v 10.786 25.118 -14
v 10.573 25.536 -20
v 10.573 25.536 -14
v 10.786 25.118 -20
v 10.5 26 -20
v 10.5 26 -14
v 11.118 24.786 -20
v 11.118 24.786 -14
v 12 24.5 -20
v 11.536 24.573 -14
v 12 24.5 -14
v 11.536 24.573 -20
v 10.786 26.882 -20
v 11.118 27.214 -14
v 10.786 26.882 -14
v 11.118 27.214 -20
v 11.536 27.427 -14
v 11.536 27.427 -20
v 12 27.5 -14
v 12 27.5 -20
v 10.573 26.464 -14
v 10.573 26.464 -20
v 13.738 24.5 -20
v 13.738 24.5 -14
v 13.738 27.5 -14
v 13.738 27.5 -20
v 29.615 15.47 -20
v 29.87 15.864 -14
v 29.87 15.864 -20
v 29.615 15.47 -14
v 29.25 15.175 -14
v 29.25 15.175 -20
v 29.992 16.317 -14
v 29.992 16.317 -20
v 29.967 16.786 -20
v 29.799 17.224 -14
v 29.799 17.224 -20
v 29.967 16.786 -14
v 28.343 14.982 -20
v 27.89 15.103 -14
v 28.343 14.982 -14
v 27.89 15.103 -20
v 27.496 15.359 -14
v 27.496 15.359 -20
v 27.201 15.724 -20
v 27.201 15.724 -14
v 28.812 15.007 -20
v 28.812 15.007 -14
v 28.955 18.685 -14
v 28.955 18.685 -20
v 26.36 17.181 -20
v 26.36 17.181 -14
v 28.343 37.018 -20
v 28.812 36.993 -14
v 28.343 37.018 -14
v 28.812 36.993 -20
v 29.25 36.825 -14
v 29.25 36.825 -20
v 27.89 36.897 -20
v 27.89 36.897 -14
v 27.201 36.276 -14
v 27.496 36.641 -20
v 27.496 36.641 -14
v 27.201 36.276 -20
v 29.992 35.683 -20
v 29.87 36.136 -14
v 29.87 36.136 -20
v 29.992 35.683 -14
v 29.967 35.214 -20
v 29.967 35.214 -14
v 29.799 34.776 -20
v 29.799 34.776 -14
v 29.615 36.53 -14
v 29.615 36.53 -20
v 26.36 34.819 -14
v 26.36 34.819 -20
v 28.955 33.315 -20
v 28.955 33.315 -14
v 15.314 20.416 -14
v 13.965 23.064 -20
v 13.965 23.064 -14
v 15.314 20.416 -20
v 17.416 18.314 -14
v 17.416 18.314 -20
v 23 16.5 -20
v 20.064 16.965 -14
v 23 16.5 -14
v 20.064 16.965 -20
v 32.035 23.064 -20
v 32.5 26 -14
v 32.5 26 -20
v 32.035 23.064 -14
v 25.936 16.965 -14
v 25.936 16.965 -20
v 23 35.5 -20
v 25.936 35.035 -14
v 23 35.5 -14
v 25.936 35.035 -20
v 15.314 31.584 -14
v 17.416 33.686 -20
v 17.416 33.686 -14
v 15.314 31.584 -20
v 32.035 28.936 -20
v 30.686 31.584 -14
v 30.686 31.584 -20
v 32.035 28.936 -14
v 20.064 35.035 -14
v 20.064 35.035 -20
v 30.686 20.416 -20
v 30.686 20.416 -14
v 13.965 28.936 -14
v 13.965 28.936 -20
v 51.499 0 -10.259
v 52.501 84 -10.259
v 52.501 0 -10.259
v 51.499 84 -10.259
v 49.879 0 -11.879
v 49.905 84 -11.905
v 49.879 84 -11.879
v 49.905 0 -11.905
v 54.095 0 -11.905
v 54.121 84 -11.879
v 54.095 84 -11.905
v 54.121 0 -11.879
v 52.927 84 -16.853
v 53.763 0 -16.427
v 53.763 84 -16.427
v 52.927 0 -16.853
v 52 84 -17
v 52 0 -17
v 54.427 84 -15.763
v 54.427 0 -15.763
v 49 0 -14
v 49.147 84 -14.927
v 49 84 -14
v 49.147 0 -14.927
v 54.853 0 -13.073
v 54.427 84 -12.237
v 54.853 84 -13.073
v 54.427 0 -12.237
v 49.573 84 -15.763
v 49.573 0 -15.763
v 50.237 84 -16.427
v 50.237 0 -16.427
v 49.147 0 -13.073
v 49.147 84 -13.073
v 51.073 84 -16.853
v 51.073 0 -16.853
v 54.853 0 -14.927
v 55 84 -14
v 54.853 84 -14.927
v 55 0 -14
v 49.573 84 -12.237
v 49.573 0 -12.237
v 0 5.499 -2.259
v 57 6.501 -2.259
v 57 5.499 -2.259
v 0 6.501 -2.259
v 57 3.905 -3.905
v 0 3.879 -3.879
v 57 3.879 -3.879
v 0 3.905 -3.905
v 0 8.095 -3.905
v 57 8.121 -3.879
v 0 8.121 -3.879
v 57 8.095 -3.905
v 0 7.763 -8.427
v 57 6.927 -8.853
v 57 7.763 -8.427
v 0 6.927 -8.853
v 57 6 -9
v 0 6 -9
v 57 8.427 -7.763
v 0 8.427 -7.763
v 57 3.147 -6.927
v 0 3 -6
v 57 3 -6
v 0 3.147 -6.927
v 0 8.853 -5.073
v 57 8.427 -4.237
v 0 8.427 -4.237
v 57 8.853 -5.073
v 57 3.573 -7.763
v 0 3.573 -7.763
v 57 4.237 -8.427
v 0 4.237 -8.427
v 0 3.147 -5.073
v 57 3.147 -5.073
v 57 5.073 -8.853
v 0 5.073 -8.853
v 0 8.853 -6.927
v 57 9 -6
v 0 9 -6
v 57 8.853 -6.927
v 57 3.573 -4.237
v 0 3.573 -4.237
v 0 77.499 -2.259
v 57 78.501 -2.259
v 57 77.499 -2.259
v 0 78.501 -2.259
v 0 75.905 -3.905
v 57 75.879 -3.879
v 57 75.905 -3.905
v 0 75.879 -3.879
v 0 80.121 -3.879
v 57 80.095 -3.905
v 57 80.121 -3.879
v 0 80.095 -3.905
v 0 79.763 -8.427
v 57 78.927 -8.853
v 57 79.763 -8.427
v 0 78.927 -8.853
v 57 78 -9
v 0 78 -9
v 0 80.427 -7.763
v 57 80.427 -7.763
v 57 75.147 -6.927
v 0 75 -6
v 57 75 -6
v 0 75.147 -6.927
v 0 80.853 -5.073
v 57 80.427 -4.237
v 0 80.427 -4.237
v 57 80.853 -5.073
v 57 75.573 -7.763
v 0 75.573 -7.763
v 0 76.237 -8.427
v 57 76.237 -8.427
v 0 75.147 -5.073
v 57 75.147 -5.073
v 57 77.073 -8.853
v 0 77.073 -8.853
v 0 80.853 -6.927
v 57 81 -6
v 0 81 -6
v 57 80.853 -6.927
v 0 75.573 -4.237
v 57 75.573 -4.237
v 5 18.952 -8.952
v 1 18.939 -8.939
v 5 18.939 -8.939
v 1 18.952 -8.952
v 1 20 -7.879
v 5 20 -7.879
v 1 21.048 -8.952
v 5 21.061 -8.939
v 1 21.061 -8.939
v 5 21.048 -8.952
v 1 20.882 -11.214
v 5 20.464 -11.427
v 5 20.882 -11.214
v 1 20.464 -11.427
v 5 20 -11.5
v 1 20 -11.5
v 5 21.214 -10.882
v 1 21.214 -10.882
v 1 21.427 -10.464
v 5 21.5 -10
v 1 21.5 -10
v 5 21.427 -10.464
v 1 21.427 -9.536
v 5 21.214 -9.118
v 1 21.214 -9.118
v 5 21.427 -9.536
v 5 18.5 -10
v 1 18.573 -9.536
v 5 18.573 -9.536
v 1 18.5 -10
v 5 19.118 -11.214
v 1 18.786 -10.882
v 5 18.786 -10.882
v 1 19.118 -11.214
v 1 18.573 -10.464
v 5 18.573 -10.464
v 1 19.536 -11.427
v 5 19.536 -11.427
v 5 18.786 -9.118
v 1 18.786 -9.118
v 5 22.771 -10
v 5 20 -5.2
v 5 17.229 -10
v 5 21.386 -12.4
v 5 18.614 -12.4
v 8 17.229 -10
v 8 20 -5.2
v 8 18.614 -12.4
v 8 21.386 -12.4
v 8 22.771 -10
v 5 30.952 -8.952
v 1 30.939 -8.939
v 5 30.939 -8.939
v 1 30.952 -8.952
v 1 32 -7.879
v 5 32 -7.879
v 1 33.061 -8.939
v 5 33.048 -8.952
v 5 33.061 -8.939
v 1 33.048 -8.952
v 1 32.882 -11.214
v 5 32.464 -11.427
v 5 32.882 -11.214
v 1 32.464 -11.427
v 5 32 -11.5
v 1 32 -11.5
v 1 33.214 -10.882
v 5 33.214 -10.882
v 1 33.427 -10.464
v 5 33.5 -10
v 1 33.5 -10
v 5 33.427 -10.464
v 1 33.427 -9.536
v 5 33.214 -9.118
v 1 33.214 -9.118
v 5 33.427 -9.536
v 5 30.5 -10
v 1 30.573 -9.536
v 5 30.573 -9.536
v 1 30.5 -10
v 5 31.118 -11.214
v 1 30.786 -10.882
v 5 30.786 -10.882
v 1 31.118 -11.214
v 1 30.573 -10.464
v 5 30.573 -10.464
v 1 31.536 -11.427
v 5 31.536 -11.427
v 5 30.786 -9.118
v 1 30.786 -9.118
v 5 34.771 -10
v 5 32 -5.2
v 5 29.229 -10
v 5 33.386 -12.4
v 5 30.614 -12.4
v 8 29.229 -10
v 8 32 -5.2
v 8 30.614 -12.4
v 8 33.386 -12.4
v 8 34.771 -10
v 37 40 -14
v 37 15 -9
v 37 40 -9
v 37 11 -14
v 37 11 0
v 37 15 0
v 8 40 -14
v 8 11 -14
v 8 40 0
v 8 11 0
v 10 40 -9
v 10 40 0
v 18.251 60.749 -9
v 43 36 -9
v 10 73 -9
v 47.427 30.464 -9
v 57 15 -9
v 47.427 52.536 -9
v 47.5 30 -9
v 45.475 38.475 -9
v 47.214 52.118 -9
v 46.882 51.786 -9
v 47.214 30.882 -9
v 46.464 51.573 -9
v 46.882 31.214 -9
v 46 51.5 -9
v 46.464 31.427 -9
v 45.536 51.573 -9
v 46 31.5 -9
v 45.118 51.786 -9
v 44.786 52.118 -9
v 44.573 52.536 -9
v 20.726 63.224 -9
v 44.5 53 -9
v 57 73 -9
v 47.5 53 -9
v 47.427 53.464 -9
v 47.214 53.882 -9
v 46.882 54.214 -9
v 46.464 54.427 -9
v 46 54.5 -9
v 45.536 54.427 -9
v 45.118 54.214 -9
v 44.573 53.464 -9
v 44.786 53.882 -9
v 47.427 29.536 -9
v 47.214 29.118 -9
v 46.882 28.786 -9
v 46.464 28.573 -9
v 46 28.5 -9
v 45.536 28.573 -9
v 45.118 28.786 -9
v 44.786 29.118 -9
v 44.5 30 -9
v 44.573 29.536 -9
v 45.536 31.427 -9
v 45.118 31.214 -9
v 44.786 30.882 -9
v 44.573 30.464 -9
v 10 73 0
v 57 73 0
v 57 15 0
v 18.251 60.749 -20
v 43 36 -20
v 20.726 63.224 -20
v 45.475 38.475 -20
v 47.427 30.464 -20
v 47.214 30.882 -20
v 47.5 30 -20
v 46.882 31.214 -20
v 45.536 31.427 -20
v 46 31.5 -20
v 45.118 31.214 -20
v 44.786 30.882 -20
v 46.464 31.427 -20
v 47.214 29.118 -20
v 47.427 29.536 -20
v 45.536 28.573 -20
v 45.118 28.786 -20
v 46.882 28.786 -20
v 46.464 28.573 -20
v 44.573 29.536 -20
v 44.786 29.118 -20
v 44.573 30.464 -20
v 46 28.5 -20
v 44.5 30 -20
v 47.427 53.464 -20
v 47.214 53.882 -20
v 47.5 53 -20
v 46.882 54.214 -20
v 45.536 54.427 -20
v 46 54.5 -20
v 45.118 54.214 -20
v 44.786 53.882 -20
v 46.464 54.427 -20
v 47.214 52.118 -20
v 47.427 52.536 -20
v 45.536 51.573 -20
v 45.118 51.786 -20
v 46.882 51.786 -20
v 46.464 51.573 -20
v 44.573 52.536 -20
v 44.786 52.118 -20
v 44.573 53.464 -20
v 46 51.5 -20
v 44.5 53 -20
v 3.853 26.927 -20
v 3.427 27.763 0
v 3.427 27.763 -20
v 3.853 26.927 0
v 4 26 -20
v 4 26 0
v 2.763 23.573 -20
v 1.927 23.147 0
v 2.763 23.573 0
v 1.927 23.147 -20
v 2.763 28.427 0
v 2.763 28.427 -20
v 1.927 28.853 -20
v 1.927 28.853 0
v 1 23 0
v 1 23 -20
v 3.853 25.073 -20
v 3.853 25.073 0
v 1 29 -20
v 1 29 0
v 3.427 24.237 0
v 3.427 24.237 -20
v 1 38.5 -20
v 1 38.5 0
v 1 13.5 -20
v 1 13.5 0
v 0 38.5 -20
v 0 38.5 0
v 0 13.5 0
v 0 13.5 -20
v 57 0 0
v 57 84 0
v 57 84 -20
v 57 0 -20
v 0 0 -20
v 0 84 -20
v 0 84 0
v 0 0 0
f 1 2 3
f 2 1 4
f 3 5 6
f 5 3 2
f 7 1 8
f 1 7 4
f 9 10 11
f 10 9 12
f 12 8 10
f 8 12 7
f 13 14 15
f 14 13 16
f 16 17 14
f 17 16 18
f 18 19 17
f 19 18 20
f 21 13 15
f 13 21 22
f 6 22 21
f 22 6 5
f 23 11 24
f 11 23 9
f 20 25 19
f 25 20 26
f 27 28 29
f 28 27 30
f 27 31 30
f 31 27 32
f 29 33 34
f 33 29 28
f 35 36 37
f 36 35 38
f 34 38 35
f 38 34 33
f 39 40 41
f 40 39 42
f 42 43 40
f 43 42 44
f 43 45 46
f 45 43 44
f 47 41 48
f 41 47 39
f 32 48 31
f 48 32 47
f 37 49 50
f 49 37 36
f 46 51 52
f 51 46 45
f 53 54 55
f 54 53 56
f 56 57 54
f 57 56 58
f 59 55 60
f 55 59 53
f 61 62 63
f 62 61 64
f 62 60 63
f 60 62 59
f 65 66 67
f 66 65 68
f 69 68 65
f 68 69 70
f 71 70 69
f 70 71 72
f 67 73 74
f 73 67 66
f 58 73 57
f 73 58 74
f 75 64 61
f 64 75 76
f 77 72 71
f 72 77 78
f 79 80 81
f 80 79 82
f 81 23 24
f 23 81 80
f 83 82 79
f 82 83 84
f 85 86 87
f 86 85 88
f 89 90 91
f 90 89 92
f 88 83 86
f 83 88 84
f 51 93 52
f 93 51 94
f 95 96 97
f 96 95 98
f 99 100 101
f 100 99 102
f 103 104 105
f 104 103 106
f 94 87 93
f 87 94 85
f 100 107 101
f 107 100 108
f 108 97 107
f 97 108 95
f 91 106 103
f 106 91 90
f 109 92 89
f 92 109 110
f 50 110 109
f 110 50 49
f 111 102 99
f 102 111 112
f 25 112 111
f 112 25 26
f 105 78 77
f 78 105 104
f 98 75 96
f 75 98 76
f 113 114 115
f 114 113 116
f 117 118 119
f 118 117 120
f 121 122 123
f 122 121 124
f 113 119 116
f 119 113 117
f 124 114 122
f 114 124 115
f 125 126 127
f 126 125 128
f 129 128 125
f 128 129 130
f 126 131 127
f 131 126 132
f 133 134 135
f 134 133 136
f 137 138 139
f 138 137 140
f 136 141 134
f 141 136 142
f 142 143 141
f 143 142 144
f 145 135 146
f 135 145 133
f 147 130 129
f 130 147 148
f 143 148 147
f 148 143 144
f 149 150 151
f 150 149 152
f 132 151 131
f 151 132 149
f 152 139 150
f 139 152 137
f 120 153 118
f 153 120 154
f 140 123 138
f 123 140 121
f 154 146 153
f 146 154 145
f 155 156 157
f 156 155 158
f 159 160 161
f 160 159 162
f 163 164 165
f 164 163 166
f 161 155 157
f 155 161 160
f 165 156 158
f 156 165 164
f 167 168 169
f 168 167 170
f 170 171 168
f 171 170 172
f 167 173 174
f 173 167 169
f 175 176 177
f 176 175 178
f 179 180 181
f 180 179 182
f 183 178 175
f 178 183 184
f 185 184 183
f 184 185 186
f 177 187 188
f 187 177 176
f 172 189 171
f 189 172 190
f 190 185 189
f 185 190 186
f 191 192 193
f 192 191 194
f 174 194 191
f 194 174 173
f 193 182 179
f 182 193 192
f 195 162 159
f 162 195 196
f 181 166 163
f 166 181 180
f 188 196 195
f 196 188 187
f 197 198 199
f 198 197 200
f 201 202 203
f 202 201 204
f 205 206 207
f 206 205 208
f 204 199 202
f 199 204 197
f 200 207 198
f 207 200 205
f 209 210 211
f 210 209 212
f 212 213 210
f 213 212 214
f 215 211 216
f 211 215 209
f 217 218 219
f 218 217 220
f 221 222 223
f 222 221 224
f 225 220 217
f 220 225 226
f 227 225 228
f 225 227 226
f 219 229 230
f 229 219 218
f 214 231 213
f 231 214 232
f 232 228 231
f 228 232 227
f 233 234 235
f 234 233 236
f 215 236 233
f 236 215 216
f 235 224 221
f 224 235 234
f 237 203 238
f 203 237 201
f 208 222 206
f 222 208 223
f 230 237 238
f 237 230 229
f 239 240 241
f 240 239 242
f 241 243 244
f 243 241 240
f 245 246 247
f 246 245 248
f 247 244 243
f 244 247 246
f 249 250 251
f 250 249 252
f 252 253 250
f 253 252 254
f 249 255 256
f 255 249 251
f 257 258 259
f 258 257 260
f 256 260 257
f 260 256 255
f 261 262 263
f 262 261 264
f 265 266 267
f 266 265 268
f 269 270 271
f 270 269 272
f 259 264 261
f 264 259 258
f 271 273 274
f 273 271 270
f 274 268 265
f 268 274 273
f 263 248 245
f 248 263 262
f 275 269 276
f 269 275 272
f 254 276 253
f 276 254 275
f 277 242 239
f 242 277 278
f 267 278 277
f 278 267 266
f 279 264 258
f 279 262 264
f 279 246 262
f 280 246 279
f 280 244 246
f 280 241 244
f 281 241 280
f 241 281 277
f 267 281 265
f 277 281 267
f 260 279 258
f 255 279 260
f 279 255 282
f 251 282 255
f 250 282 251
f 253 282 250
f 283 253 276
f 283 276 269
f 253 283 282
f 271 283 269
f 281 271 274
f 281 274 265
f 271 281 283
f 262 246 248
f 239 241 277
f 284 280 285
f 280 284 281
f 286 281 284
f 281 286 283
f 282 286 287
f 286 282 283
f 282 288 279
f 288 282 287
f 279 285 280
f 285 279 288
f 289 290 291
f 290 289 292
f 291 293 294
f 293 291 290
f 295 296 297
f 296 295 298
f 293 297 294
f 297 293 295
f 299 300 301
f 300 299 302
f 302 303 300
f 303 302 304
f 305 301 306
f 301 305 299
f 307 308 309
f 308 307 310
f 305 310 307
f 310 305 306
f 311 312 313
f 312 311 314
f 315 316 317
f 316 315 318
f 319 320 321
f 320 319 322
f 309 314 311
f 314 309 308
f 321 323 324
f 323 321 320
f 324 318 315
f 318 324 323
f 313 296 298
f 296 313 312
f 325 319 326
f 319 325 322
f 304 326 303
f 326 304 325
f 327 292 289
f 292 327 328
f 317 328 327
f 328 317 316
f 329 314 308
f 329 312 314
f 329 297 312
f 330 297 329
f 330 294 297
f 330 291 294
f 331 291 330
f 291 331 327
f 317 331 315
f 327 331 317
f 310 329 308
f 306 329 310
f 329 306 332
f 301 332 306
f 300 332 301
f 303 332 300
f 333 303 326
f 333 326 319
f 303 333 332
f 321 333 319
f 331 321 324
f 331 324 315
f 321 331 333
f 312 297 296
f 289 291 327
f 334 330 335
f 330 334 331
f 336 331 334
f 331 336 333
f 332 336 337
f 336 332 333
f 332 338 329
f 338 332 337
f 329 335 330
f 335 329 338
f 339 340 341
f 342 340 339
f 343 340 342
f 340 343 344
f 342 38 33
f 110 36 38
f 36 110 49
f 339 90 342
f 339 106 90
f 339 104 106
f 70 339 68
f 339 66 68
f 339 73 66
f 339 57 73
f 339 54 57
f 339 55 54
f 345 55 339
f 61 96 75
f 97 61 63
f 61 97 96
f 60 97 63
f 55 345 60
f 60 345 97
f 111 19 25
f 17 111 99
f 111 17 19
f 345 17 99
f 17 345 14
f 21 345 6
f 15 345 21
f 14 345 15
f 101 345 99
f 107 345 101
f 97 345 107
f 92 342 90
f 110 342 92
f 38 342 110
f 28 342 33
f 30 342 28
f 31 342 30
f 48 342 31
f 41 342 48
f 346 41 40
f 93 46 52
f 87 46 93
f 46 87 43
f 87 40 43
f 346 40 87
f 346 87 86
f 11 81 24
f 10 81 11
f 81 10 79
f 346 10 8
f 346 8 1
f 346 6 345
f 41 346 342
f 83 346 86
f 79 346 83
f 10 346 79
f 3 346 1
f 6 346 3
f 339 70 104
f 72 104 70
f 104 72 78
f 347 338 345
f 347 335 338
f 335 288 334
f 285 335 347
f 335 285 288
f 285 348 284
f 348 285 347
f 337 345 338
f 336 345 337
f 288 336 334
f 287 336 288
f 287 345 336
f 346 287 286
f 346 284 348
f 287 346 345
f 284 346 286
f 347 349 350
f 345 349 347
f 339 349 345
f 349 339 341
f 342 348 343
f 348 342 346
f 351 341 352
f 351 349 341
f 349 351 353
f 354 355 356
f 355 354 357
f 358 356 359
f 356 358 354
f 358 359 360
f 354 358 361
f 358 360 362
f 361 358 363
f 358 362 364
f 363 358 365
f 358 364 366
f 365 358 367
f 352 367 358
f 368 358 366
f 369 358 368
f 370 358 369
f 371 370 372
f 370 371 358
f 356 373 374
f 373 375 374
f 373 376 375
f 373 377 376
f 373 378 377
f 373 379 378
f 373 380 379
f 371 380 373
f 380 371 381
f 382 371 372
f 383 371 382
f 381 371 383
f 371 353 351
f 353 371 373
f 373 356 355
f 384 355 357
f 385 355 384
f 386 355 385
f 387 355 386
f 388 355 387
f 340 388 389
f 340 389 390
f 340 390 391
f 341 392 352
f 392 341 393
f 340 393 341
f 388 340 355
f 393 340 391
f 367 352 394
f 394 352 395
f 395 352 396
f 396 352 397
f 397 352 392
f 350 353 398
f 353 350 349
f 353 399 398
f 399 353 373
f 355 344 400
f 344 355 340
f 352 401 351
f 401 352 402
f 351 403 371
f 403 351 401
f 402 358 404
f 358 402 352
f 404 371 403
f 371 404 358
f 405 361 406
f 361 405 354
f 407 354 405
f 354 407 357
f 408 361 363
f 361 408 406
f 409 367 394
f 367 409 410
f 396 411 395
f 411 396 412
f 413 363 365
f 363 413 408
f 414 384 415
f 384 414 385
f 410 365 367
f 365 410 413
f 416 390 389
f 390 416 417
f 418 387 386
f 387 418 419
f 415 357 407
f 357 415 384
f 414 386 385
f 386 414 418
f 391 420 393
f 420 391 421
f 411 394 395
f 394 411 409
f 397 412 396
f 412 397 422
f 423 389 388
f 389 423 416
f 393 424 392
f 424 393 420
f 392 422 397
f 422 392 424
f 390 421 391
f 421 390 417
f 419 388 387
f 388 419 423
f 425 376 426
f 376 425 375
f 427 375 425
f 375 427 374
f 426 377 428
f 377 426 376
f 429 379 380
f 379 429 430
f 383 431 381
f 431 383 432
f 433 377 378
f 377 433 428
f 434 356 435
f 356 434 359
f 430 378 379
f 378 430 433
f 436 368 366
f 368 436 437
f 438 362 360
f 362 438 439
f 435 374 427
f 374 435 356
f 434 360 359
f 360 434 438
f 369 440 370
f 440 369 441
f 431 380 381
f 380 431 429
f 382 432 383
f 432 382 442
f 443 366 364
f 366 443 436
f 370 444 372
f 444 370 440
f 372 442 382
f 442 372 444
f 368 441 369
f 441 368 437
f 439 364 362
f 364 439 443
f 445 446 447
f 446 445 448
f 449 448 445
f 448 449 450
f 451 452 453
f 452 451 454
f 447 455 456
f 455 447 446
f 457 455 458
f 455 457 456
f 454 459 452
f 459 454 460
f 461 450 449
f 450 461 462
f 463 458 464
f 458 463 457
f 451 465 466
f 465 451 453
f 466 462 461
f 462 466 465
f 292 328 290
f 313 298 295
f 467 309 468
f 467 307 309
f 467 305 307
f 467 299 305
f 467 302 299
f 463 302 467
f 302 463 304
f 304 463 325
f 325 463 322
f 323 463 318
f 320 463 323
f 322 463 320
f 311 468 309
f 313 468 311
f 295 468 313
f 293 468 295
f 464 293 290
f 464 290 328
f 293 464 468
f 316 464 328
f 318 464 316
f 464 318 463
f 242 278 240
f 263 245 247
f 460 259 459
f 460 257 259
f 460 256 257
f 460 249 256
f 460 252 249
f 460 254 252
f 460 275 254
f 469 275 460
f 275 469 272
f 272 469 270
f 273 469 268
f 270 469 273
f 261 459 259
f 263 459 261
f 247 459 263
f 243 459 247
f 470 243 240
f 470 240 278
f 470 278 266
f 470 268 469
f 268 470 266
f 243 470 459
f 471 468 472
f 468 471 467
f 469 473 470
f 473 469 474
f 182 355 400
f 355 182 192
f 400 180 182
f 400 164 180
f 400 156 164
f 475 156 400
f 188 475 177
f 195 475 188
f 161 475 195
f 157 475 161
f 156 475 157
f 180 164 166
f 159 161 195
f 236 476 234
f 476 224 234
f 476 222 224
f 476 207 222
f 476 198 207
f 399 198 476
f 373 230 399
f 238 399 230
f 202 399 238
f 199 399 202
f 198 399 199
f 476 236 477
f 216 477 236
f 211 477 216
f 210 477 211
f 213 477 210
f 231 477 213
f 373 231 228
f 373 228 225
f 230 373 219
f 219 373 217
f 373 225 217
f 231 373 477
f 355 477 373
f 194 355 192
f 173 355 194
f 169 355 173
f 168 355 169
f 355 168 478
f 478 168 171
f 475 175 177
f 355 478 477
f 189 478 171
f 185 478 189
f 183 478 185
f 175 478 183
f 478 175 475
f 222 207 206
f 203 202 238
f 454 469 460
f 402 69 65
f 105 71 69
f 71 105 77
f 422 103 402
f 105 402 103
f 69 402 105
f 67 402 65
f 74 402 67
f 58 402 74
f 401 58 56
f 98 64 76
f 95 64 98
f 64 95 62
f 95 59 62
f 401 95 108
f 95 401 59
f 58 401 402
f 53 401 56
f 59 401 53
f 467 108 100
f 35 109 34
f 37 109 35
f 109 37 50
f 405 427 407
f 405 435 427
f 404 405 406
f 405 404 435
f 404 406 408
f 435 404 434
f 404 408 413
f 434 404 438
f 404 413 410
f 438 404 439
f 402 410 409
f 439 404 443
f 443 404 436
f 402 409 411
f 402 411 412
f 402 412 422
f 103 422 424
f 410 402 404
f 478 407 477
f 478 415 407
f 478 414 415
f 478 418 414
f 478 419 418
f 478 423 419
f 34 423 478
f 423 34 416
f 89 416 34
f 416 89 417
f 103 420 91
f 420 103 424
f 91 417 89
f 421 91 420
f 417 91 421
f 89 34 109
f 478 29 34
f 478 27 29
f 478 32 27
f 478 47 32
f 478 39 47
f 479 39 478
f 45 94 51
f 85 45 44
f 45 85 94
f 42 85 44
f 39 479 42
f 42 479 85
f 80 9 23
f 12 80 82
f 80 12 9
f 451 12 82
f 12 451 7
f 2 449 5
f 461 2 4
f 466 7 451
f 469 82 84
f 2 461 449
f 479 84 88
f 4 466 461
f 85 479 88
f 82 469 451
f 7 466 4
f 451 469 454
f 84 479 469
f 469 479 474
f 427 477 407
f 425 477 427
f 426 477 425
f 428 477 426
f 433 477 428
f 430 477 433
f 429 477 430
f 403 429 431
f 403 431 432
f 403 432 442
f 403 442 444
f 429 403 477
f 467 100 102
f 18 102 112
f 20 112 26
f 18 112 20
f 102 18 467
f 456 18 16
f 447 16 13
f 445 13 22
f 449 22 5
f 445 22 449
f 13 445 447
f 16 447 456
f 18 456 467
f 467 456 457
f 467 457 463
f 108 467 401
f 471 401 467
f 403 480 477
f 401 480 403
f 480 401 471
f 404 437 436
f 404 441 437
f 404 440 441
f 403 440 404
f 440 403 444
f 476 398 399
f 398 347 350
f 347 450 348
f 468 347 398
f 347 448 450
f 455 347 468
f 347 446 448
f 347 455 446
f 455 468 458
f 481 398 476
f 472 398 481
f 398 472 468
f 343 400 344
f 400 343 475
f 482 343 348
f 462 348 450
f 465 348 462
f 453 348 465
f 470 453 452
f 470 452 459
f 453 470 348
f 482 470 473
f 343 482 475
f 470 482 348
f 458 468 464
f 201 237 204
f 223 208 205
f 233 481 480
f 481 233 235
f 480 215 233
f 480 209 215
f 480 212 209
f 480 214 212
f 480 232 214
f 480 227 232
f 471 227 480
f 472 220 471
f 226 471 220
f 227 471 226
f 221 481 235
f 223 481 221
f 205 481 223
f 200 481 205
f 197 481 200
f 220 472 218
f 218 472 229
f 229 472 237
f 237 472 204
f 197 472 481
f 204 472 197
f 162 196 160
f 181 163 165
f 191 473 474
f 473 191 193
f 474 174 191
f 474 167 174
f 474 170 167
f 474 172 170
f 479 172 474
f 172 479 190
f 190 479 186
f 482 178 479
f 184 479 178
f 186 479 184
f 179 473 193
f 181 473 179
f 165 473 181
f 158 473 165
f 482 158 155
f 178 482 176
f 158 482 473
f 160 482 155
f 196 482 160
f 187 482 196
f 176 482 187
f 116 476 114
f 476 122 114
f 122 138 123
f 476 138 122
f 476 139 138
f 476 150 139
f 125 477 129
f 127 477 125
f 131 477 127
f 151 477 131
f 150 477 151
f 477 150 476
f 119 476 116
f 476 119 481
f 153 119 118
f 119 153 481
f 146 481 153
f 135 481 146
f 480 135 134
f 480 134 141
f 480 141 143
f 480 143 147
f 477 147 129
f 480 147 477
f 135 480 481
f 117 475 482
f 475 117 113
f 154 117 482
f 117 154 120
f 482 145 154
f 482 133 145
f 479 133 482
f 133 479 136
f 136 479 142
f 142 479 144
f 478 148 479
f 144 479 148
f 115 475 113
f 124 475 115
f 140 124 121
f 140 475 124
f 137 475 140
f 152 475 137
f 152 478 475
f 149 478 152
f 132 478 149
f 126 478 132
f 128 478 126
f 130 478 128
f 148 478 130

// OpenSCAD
// file: library.scad
include <parameters.scad>;


// inner and outer product.  Why aren't these standard?!!!?

function ip(v1 = [0,0,0], v2 = [0,0,0]) = v1.x*v2.x + v1.y*v2.y + v1.z*v2.z;

function op(v1 = [0,0,0], v2 = [0,0,0]) = [v1.y*v2.z - v1.z*v2.y, v1.z*v2.x - v1.x*v2.z, v1.x*v2.y - v1.y*v2.x];


/*
  This gives either a NEMA 14 stepper motor or its mounting holes.

  If body is true, you get the motor.  If it is false you get the screw holes and central
  hole needed to mount the motor.  If counterbore is positive and you are generating the mounting holes
  then the screw holes will get fat to accomodate a cap-screw head counterbore mm away from the face 
  of the motor.  For no counterbores, set counterbore negative.

*/

module nema14(body = true, counterbore = -1)
{
	color([1,0.4,0.4,1])
	union()
	{
		if(body)
		{
			translate([0, 0, nema14_shaft_length/2 - nema14_shaft_projection - nema14_hub_depth])
				cylinder(r = nema14_shaft/2, h = nema14_shaft_length, center = true, $fn=20);
			translate([0, 0, -nema14_hub_depth])
				cylinder(r = nema14_hub/2, h = nema14_hub_depth*2, center = true, $fn=20);
	
			translate([0, 0, nema14_length/2])
				cube([nema14_square,nema14_square,nema14_length], center = true);
		} else
			translate([0, 0, -20])
				cylinder(r = nema14_hub/2 + 1, h = 50, center = true, $fn=20);

		if(!body)
		{
			union()
			{
				for ( x = [0:1] ) 
				for ( y = [0:1] )
				{
					translate([(x-0.5)*nema14_screws, (y-0.5)*nema14_screws, -20])
						cylinder(r = screwsize/2, h = 50, center = true, $fn=10);
					if(counterbore >= 0)
						translate([(x-0.5)*nema14_screws, (y-0.5)*nema14_screws, -25-counterbore])
							cylinder(r = screwsize, h = 50, center = true, $fn=10);
				}
			}
		}
	}


}


// Pentagon nut that matches a hexagon...

module pentanut(height=40)
{
	rotate([0,0,60])
	intersection()
	{
		translate([-nutsize,-nutsize*5,-20])
			cube([nutsize*10, nutsize*10,height]);
		rotate([0,0,60])
			translate([-nutsize,-nutsize*5,-20])
				cube([nutsize*10, nutsize*10,height]);
		rotate([0,0,120])
			translate([-nutsize,-nutsize*5,-20])
				cube([nutsize*10, nutsize*10,height]);
		rotate([0,0,180])
			translate([-nutsize,-nutsize*5,-20])
				cube([nutsize*10, nutsize*10,height]);
		rotate([0,0,240])
			translate([-nutsize,-nutsize*5,-20])
				cube([nutsize*10, nutsize*10,height]);
	}
}


// Make a RepRap teardrop with its axis along Z
// If truncated is true, chop the apex; if not, come to a point

// I stole this function from Erik...


module teardrop(r=1.5, h=20, truncateMM=0.5)
{
	union()
	{
		if(truncateMM > 0)
		{
			intersection()
			{
				translate([truncateMM,0,h/2]) 
					scale([1,1,h])
						cube([r*2.8275,r*2,1],center=true);
				scale([1,1,h]) 
						rotate([0,0,3*45])
							cube([r,r,1]);
			}
		} else
		{
			scale([1,1,h])
				rotate([0,0,3*45])
					cube([r,r,1]);
		}
		cylinder(r=r, h = h, $fn=20);
	}
}


// Make a ball-bearing holder cutout

module bearing_holder(radius = 6.5)
{
	union()
	{
		cylinder (h = radius*20, r = radius, center = true, $fn = 20);
		for(i=[0:2])
		{
			rotate([0,0,120*i])
				translate([radius+screwsize/2, 0, 0])
					union()
					{
						cylinder (h = radius*20, r = screwsize/2, center = true, $fn = 20);
						translate([-screwsize, 0, 0])
							cube([2*screwsize, screwsize, radius*20], center = true);
					}
		}
	}
}

// Make a cuboid with a 45 degree top for vertical slots etc

module cen_hat(size)
{
	translate([0, 0, size.x/sqrt(2)])
		union()
		{
			rotate([0, 45, 0])
				cube([size.x, size.y, 5*max(size.x, max(size.y, size.z))], center=true);
			rotate([0, -45, 0])
				cube([size.x, size.y, 5*max(size.x, max(size.y, size.z))], center=true);
		}
}

module hat_cube(size = [1,1,1], center = false)
{
	difference()
	{
		cube(size, center);
		if(center)
			translate([0, 0, size.z/2])
				cen_hat(size);
		else
			translate([size.x/2, size.y/2, size.z])
				cen_hat(size);
	}
}



module rod(length, threaded) if (threaded && renderrodthreads) {
	linear_extrude(height = length, center = true, convexity = 10, twist = -360 * length / rodpitch, $fn = fn)
		translate([rodsize * 0.1 / 2, 0, 0])
			circle(r = rodsize * 0.9 / 2, $fn = fn);
} else cylinder(h = length, r = rodsize / 2, center = true, $fn = fn);


module rodnut(position, washer) render() translate([0, 0, position]) {
	intersection() {
		scale([1, 1, 0.5]) sphere(r = 1.05 * rodsize, center = true);
		difference() {
			cylinder (h = rodnutsize, r = rodnutdiameter / 2, center = true, $fn = 6);
			rod(rodnutsize + 0.1);
		}
	}
	if (washer == 1 || washer == 4) rodwasher(((position > 0) ? -1 : 1) * (rodnutsize + rodwashersize) / 2);
	if (washer == 2 || washer == 4) rodwasher(((position > 0) ? 1 : -1) * (rodnutsize + rodwashersize) / 2);
}


module rodwasher(position) render() translate ([0, 0, position]) difference() {
	cylinder(r = rodwasherdiameter / 2, h = rodwashersize, center = true, $fn = fn);
	rod(rodwashersize + 0.1);
}


module screw(length, nutpos, washer, bearingpos = -1) union(){
	translate([0, 0, -length / 2]) if (renderscrewthreads) {
		linear_extrude(height = length, center = true, convexity = 10, twist = -360 * length / screwpitch, $fn = fn)
			translate([screwsize * 0.1 / 2, 0, 0])
				circle(r = screwsize * 0.9 / 2, $fn = fn);
	} else cylinder(h = length, r = screwsize / 2, center = true, $fn = fn);
	render() difference() {
		translate([0, 0, screwsize / 2]) cylinder(h = screwsize, r = screwsize, center = true, $fn = fn);
		translate([0, 0, screwsize]) cylinder(h = screwsize, r = screwsize / 2, center = true, $fn = 6);
	}
	if (washer > 0 && nutpos > 0) {
		washer(nutpos);
		nut(nutpos + washersize);
	} else if (nutpos > 0) nut(nutpos);
	if (bearingpos >= 0) bearing(bearingpos);
}


module bearing(position) render() translate([0, 0, -position - bearingwidth / 2]) union() {
	difference() {
		cylinder(h = bearingwidth, r = bearingsize / 2, center = true, $fn = fn);
		cylinder(h = bearingwidth * 2, r = bearingsize / 2 - 1, center = true, $fn = fn);
	}
	difference() {
		cylinder(h = bearingwidth - 0.5, r = bearingsize / 2 - 0.5, center = true, $fn = fn);
		cylinder(h = bearingwidth * 2, r = screwsize / 2 + 0.5, center = true, $fn = fn);
	}
	difference() {
		cylinder(h = bearingwidth, r = screwsize / 2 + 1, center = true, $fn = fn);
		cylinder(h = bearingwidth + 0.1, r = screwsize / 2, center = true, $fn = fn);
	}
}


module nut(position, washer) render() translate([0, 0, -position - nutsize / 2]) {
	intersection() {
		scale([1, 1, 0.5]) sphere(r = 1.05 * screwsize, center = true);
		difference() {
			cylinder (h = nutsize, r = nutdiameter / 2, center = true, $fn = 6);
			cylinder(r = screwsize / 2, h = nutsize + 0.1, center = true, $fn = fn);
		}
	}
	if (washer > 0) washer(0);
}


module washer(position) render() translate ([0, 0, -position - washersize / 2]) difference() {
	cylinder(r = washerdiameter / 2, h = washersize, center = true, $fn = fn);
	cylinder(r = screwsize / 2, h = washersize + 0.1, center = true, $fn = fn);
}


//rod(20);
//translate([rodsize * 2.5, 0, 0]) rod(20, true);
//translate([rodsize * 5, 0, 0]) screw(10, true);
//translate([rodsize * 7.5, 0, 0]) bearing();
//translate([rodsize * 10, 0, 0]) rodnut();
//translate([rodsize * 12.5, 0, 0]) rodwasher();
//translate([rodsize * 15, 0, 0]) nut();
//translate([rodsize * 17.5, 0, 0]) washer();

//hat_cube(size=[2,40,2], center=false);

//bearing_holder();

//teardrop();

//pentanut();

//nema14(body = true, counterbore = -1);
// file: parameters.scad
// Parameters file for RepRap Huxley

pi=3.14159265;

// The relative location in your file system where the .dxf files are
// DXFs are for quick development.  They should be replaced by parameterised CSG in dure course.

fileroot="DXF-files/";

rodsize = 6;	//threaded/smooth rod diameter in mm
xaxis = 182.5;	//width of base in mm
yaxis = 266.5;	//length of base in mm


screwsize = 3;	//bearing bore/screw diameter in mm
bearingsize = 10;	//outer diameter of bearings in mm
bearingwidth = 4;	//width of bearings in mm


rodpitch = rodsize / 6;
rodnutsize = 0.8 * rodsize;
rodnutdiameter = 1.9 * rodsize;
rodwashersize = 0.2 * rodsize;
rodwasherdiameter = 2 * rodsize;
screwpitch = screwsize / 6;
nutsize = 0.8 * screwsize;
nutdiameter = 1.9 * screwsize;
washersize = 0.2 * screwsize;
washerdiameter = 2 * screwsize;
partthick = 2 * rodsize;
vertexrodspace = 2 * rodsize;


c = [0.3, 0.3, 0.3];
rodendoffset = rodnutsize + rodwashersize * 2 + partthick / 2;
vertexoffset = vertexrodspace + rodendoffset;


renderrodthreads = false;
renderscrewthreads = false;
fn = 36;

// The gap between the joining rods at a vertex

vertex_radius=sqrt(rodsize*rodsize + vertexoffset*vertexoffset);
vertex_ang = atan(vertexoffset/rodsize)-30;
vertex_gap = 2*vertex_radius*cos(vertex_ang);

// Nema 14 dimensions - these are absolute

nema14_square=35.3;
nema14_screws=26;
nema14_hub=22;
nema14_hub_depth=2;
nema14_length=36;
nema14_shaft=5;
nema14_shaft_length=66;
nema14_shaft_projection=19;

// Limit switch parameters

limit_switch_hole_diameter=2.5;
limit_switch_centres=9.5;

// The RepRap slide bearings

bearing_mount_centres=18;
bearing_width=7;

// X axis parameters - many should be relative

x_bar_gap=30;
motor_center_y = 26;
bar_clamp_x=5;
bar_clamp_y=8;
bar_clamp_x_gap=23;
bearing_y=50;
bearing_x=bar_clamp_x_gap + 10;
hole_land=4;
thickness=5;
bearing_low_z = 8;
bearing_z_gap = 25;
bearing_plate_width = bearing_mount_centres+2*hole_land + 10;
bearing_plate_overlap=0.5;
bearing_plate_support=10;
// main file
include <parameters.scad>;
use <library.scad>;

zax= 57;
zay = 84;
zaz=20;

//import_stl("../z-leadscrew-base-motor_2.stl", convexity = 7);


module z_axis_motor_base()
{
	mirror([0,0,1])
		difference()
		{
			// Starting block

			cube([zax,zay,zaz]);

			// Holes in it - colour them so we can distinguish them

			color([0.4,0.4,1,1])
			{

// Body cavity


				translate([8,11,-16])
					cube([29,29,30]);
				translate([10,15,-6])
					cube([70,58,15]);

// The adjuster slot

				translate([43,36,-40])
					rotate([0,0,45])
						cube([3.5,35,130]);
				
				
// The bearing holder

				translate([23,26,0])
					rotate([0,0,180])
						bearing_holder(radius=9.5);
				
// Vertical M3 screw holes

				translate([46,30,0])
					cylinder(r=screwsize/2,h=zay,center=true,$fn=20);
				translate([46,53,0])
					cylinder(r=screwsize/2,h=zay,center=true,$fn=20); 

// The Z rod notch

				translate([1,26,0])
					cylinder(r=rodsize/2,h=zay,center=true,$fn=20); 
				
// The M6 rod in the triangle frame

				translate([52,-10,14])
					rotate([0,-90,0])
						rotate([-90,0,0])
							teardrop(r=rodsize/2,h=zay*2,truncateMM=0.5);
		
// The M6 strengthening rods that run across
		
				translate([zax+10,6,6])
					rotate([0,-90,0])
						teardrop(r=rodsize/2,h=zay*2,truncateMM=0.5);
				
				translate([zax+10,78,6])
					rotate([0,-90,0])
						teardrop(r=rodsize/2, h=zay*2,truncateMM=0.5);
				
//  Z-rod clamp M3 holes

				translate([20,20,10])
					rotate([0,-90,0])
					{
						teardrop(r=screwsize/2,h=zay*2,truncateMM=0);
						translate([0,0,25])
						pentanut(10);
					}
				
				translate([20,32,10])
					rotate([0,-90,0])
					{
						teardrop(r=screwsize/2,h=zay*2,truncateMM=0);
						translate([0,0,25])
						pentanut(10);
					}
				
// Z clamp notch

				translate([0,26,10])
					cube([2,25,40], center=true);
			}
		}
}

z_axis_motor_base();
